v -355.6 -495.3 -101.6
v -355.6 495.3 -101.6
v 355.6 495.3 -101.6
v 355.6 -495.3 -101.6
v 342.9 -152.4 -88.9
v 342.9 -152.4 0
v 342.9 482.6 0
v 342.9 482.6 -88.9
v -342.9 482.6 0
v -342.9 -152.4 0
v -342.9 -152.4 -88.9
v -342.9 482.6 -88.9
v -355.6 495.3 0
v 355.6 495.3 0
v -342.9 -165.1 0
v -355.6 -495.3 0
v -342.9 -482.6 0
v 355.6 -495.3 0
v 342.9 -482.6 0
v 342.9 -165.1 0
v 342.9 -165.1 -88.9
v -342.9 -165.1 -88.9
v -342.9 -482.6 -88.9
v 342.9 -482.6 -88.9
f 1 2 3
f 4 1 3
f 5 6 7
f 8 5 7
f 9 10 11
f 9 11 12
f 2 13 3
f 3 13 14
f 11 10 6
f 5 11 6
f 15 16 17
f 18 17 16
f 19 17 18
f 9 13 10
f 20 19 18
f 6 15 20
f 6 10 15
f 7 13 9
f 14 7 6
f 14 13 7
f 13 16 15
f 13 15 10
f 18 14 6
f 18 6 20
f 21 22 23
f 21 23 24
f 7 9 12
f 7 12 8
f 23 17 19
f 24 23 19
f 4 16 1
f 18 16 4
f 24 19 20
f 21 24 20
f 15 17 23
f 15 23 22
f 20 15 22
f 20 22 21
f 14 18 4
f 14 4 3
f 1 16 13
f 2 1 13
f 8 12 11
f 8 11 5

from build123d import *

# Parameters (mm, degrees)
F0_W     = 711.2
F0_H     = 990.6
F0_W_2   = 685.8
F0_H_2   = 317.5
F0_H_3   = 635
F0_H_4   = 12.7
F1_DEPTH = 101.6
F2_DEPTH = 88.9


with BuildPart() as f1:
    # F0 (on Top) → F1 (new body)
    with BuildSketch(Plane.XY):
        Rectangle(F0_W, F0_H)
        Polygon((342.9, -482.6), (-342.9, -482.6), (-342.9, -165.1), (-342.9, -152.4), (-342.9, 482.6), (342.9, 482.6), (342.9, -152.4), (342.9, -165.1), align=None, mode=Mode.SUBTRACT)
        with Locations((0, -323.85)):
            Rectangle(F0_W_2, F0_H_2)
        with Locations((0, 165.1)):
            Rectangle(F0_W_2, F0_H_3)
        with Locations((0, -158.75)):
            Rectangle(F0_W_2, F0_H_4)
    extrude(amount=-F1_DEPTH)

    # F0 (on Top) → F2 (cut, through all)
    with BuildSketch(Plane.XY):
        with Locations((0, 165.1)):
            Rectangle(F0_W_2, F0_H_3)
        with Locations((0, -323.85)):
            Rectangle(F0_W_2, F0_H_2)
    extrude(amount=-F2_DEPTH, mode=Mode.SUBTRACT)


solid = f1.part
